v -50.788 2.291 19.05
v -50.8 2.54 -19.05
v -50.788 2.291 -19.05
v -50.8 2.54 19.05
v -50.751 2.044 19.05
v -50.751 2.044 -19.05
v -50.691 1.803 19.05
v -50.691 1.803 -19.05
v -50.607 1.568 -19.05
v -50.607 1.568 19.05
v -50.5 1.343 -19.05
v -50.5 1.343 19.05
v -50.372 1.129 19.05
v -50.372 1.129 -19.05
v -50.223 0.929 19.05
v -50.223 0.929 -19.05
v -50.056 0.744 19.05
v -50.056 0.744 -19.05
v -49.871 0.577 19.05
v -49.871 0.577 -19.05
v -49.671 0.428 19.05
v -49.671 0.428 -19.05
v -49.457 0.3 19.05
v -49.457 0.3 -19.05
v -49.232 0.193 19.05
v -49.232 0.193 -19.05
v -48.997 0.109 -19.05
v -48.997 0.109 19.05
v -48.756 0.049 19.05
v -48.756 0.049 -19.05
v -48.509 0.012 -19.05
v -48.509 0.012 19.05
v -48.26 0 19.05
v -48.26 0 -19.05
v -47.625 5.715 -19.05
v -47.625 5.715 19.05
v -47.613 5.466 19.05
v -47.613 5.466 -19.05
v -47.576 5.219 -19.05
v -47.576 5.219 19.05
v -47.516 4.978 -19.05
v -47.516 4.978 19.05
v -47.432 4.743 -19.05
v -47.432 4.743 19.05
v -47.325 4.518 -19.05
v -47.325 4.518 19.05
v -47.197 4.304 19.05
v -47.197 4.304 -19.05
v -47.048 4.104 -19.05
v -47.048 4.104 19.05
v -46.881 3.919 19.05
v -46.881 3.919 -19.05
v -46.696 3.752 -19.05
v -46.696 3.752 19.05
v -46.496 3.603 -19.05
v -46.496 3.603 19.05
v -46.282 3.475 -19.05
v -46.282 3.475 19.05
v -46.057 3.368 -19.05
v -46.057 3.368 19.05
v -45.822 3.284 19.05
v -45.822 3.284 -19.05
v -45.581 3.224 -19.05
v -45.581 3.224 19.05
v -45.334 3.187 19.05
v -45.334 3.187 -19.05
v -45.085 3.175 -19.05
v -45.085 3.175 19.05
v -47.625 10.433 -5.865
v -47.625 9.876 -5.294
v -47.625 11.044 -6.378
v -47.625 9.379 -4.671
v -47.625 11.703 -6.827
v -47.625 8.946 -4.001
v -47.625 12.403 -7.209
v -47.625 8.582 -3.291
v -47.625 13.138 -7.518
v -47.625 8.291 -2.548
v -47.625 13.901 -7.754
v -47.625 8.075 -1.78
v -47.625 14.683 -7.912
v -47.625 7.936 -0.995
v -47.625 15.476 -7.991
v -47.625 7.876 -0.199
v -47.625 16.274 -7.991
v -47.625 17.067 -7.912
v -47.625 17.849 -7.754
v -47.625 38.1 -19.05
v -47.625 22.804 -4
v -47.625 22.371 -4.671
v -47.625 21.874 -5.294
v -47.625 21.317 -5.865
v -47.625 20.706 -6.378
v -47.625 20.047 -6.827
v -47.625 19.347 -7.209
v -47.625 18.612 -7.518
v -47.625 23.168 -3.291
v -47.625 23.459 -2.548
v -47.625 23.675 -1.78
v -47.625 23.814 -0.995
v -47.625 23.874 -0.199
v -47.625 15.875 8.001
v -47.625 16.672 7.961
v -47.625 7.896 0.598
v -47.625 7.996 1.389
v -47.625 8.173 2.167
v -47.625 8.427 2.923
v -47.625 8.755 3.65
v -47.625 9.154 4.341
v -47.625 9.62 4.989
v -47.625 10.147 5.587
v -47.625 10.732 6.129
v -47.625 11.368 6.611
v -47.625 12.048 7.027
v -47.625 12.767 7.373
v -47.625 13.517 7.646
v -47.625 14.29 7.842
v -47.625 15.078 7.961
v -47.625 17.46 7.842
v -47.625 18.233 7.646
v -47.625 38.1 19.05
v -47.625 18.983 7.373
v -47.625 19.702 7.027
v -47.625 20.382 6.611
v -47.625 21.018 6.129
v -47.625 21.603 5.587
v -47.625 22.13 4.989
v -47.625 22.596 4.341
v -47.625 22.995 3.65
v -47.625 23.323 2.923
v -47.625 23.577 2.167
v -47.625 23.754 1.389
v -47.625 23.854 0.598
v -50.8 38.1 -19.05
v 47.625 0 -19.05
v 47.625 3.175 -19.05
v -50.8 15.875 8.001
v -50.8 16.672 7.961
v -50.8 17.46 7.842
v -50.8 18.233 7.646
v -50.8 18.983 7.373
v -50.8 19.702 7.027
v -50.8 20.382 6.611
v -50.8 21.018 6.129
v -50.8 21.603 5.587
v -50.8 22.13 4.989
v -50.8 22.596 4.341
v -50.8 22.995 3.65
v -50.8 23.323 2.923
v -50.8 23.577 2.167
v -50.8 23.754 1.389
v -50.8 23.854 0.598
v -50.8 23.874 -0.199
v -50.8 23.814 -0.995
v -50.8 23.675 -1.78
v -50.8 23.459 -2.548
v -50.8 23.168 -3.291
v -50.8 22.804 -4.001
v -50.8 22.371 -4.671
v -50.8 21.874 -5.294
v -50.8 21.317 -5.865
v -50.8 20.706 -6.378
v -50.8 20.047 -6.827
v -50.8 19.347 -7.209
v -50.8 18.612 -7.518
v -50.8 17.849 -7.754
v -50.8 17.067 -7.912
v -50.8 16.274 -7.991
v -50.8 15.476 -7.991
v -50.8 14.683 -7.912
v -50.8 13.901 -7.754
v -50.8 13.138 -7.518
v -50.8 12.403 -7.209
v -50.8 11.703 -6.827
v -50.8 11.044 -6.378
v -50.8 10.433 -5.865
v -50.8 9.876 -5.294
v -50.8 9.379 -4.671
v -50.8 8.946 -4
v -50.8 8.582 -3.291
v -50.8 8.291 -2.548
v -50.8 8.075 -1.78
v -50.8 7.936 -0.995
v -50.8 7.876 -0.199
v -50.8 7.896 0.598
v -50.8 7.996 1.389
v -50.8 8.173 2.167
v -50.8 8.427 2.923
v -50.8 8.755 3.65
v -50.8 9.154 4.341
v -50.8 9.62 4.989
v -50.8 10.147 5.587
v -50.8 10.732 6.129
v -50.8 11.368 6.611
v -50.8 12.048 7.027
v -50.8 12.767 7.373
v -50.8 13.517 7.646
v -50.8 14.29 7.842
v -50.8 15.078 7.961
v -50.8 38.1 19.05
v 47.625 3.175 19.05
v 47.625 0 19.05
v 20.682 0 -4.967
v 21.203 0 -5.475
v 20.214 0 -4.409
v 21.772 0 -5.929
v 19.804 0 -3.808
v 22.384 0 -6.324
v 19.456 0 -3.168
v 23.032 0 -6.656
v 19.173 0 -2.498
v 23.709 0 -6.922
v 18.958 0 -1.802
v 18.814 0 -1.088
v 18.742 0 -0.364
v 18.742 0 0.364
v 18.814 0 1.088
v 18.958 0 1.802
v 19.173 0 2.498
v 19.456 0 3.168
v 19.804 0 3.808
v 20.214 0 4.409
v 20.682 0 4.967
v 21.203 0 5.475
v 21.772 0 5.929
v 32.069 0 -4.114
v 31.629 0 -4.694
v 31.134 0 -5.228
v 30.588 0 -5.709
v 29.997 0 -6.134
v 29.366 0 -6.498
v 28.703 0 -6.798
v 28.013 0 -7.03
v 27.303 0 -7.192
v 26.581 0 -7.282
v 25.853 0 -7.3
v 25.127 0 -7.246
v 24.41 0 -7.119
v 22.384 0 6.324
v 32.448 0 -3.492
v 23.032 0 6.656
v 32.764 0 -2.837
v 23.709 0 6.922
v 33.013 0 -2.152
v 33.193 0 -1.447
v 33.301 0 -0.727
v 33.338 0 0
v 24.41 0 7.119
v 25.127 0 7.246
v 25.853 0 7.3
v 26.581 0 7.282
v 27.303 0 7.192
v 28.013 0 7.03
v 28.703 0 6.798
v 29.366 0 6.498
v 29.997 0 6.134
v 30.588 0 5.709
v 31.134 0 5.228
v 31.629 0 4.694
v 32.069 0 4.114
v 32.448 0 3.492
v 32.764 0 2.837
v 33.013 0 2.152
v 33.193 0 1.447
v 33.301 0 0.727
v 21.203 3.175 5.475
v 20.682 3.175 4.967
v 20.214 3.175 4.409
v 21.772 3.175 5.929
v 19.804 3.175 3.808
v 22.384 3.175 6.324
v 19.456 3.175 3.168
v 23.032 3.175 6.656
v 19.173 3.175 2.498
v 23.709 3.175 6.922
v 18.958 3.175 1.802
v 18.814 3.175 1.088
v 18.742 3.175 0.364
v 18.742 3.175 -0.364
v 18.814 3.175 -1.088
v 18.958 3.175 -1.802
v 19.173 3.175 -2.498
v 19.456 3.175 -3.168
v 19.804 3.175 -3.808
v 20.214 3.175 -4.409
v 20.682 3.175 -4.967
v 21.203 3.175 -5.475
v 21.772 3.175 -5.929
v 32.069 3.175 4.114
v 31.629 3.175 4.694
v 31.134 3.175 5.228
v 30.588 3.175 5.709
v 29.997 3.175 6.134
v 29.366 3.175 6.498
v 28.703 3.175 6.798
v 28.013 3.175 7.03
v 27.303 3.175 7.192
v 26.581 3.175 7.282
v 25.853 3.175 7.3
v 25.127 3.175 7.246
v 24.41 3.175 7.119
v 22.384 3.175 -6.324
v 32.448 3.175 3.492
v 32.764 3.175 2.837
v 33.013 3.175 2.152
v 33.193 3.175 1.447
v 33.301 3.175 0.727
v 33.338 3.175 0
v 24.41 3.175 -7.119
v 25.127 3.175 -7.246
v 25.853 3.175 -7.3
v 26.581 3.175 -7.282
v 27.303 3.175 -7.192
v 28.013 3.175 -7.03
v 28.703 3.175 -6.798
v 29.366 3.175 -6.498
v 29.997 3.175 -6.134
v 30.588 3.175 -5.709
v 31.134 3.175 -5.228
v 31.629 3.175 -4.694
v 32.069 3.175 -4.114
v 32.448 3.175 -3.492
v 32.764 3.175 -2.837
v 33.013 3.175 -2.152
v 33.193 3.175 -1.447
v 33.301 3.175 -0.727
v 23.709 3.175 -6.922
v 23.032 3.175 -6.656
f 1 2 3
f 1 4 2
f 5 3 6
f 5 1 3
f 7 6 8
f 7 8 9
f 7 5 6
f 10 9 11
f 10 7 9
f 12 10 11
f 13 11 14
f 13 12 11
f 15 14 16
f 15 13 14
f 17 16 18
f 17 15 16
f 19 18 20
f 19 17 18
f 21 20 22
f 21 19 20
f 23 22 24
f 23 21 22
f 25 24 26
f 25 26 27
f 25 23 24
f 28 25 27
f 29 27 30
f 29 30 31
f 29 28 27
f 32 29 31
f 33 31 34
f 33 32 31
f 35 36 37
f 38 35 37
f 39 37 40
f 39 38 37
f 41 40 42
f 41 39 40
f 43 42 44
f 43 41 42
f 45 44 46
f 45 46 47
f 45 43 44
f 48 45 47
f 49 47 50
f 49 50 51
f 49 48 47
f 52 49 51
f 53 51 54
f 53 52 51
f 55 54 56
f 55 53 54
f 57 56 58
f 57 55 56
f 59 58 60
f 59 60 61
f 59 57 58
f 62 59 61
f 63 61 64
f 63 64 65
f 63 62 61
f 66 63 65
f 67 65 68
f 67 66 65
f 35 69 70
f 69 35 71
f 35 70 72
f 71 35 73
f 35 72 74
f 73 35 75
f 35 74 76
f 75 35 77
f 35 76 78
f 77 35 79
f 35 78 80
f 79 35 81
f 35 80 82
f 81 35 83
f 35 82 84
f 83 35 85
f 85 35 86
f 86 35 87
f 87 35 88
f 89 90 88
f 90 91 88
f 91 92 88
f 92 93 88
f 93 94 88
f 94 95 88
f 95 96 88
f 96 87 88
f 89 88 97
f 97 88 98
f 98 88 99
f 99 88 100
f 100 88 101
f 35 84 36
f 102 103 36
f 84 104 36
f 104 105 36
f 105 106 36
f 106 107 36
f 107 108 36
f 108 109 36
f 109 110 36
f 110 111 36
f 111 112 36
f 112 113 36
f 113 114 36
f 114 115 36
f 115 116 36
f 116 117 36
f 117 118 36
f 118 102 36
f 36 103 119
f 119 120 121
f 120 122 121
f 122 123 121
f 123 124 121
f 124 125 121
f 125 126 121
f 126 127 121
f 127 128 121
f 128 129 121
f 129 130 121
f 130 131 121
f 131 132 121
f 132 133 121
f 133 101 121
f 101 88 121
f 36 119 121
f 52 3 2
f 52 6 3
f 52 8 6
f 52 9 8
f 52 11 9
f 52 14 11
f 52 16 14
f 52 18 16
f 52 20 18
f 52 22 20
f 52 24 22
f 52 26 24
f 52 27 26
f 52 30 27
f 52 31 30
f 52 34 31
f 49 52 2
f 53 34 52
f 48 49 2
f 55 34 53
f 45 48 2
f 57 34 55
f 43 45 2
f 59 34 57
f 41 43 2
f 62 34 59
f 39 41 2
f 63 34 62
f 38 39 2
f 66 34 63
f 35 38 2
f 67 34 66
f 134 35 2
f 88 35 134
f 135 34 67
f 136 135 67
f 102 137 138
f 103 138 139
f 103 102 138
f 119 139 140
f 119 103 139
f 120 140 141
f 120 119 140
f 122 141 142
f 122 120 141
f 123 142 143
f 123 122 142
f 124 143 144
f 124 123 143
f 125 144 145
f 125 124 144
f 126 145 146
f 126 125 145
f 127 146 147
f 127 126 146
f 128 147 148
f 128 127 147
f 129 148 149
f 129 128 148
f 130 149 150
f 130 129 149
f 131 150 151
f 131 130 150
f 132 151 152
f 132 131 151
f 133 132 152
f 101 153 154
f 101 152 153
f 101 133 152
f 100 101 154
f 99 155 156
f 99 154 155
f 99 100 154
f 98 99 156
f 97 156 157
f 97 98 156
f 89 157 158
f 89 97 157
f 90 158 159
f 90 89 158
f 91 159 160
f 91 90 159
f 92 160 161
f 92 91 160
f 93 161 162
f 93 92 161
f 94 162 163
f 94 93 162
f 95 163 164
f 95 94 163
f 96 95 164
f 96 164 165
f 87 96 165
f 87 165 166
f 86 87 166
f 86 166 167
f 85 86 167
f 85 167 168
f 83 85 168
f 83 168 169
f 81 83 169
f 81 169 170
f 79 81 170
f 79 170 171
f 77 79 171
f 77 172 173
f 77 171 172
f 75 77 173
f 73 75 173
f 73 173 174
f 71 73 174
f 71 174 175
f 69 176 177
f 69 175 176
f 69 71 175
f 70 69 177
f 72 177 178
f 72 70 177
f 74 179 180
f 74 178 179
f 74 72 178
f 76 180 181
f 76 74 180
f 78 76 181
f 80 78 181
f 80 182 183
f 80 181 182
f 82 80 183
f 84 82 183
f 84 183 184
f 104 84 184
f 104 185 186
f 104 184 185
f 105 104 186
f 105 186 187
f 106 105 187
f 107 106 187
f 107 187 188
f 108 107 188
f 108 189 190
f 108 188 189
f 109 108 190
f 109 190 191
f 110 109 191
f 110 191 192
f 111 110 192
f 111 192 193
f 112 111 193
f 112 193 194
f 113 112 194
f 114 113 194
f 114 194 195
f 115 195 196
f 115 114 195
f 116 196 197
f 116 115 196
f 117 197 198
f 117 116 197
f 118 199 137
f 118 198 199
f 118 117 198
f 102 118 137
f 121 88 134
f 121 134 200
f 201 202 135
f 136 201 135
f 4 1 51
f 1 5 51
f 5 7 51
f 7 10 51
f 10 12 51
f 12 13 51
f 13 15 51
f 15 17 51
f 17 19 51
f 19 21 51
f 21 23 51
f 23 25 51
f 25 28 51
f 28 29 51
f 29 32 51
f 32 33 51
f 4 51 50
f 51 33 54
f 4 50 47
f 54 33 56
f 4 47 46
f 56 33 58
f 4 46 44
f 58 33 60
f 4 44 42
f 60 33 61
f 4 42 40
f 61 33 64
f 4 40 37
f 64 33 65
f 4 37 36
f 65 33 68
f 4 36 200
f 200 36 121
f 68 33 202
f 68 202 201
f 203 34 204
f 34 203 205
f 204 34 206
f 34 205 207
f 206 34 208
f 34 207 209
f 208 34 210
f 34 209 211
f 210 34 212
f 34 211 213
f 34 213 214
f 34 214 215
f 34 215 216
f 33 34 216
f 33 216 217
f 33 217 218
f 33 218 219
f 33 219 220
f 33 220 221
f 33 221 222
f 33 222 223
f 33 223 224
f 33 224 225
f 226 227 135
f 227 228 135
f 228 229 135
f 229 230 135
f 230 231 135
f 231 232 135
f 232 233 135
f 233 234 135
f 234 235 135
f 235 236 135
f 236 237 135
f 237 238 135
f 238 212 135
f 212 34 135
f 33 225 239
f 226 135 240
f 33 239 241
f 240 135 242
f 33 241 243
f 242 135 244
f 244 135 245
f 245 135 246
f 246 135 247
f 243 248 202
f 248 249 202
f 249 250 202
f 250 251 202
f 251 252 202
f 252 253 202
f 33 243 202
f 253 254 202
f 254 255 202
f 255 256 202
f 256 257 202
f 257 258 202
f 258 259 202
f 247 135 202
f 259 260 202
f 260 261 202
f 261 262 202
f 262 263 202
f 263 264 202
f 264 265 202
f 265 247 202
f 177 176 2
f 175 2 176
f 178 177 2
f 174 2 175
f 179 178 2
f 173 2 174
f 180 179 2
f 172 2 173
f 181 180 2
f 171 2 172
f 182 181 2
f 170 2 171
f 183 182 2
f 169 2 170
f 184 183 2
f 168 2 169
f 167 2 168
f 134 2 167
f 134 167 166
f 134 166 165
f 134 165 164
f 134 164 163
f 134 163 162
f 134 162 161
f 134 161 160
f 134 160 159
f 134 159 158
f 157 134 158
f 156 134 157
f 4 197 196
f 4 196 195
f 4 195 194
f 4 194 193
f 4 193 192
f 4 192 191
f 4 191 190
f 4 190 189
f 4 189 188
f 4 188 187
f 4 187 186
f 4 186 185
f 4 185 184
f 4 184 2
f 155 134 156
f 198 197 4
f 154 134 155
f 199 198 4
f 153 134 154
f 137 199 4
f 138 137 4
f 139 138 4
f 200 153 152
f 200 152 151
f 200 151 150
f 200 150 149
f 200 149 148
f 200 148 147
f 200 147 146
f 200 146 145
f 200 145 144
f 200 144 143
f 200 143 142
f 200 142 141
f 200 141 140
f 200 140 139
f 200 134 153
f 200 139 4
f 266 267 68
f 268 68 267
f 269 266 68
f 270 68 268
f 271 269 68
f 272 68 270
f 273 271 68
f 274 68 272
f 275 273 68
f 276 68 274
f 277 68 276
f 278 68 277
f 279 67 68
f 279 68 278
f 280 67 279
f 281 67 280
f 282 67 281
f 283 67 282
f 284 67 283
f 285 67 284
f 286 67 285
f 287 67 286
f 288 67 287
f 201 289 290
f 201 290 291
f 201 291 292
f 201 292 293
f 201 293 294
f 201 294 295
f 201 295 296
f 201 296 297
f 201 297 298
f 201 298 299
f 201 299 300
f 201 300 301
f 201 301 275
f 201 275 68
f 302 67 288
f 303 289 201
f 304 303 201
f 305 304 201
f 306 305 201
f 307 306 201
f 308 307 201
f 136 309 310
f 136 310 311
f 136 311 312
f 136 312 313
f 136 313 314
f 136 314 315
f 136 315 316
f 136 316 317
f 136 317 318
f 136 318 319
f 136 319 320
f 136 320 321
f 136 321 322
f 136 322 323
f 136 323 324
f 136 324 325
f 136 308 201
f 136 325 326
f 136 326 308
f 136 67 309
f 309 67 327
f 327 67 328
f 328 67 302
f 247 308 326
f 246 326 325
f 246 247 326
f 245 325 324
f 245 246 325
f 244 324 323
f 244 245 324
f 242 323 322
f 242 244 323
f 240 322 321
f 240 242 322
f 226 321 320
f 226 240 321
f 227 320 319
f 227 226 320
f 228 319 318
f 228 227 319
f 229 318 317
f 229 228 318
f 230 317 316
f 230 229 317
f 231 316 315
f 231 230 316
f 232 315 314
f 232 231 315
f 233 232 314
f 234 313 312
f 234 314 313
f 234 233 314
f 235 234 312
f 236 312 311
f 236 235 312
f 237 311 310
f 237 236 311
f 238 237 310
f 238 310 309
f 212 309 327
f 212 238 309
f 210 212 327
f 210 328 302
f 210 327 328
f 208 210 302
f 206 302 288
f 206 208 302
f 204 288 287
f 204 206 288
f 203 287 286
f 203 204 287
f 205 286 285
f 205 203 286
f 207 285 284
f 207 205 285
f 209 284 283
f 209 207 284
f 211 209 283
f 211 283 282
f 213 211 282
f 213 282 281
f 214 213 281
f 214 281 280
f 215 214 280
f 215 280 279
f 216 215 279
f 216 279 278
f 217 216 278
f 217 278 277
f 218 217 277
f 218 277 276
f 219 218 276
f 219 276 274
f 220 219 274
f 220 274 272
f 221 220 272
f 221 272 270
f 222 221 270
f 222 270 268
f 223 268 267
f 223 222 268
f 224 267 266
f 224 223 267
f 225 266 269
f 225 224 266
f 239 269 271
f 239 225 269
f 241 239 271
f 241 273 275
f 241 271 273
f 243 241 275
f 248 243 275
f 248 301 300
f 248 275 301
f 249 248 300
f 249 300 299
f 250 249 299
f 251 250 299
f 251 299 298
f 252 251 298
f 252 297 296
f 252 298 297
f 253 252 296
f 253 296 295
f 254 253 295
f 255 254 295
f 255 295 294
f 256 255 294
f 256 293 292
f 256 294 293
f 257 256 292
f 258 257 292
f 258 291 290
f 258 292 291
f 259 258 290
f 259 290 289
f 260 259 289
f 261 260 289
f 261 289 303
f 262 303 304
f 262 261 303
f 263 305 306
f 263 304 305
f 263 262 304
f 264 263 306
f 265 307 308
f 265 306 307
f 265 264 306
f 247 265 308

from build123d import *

# Parameters (mm, degrees)
SKETCH1_W           = 95.25
SKETCH1_H           = 38.1
BOSS_EXTRUDE1_DEPTH = 3.175
SKETCH2_W           = 38.1
SKETCH2_H           = 38.1
BOSS_EXTRUDE2_DEPTH = 3.175
SKETCH3_R           = 7.3025
CUT_EXTRUDE2_DEPTH  = 39.1
SKETCH4_R           = 8.001
CUT_EXTRUDE3_DEPTH  = 4.175
FILLET1_R           = 2.54


with BuildPart() as part:
    # Sketch1 → Boss-Extrude1 (new body)
    with BuildSketch(Plane(origin=(0, 0, 0), x_dir=(1, 0, 0), z_dir=(0, 1, 0))):
        Rectangle(SKETCH1_W, SKETCH1_H)
    extrude(amount=BOSS_EXTRUDE1_DEPTH)

    # Sketch2 → Boss-Extrude2 (add)
    with BuildSketch(Plane.ZY.offset(47.625)):
        with Locations((0, 19.05)):
            Rectangle(SKETCH2_W, SKETCH2_H)
    extrude(amount=BOSS_EXTRUDE2_DEPTH)

    # Sketch3 → Cut-Extrude2 (cut, through all)
    with BuildSketch(Plane(origin=(0, 0, 0), x_dir=(1, 0, 0), z_dir=(0, 1, 0))):
        with Locations((26.035, 0)):
            Circle(SKETCH3_R)
    extrude(amount=CUT_EXTRUDE2_DEPTH, mode=Mode.SUBTRACT)

    # Sketch4 → Cut-Extrude3 (cut, through all)
    with BuildSketch(Plane.ZY.offset(47.625)):
        with Locations((0, 15.875)):
            Circle(SKETCH4_R)
    extrude(amount=CUT_EXTRUDE3_DEPTH, mode=Mode.SUBTRACT)

    # Fillet1
    fillet1_edges = [part.edges().sort_by_distance(p)[0] for p in [
        (-47.625, 3.175, 0),
        (-50.8, 0, 0),
    ]]
    fillet(fillet1_edges, radius=FILLET1_R)


solid = part.part
